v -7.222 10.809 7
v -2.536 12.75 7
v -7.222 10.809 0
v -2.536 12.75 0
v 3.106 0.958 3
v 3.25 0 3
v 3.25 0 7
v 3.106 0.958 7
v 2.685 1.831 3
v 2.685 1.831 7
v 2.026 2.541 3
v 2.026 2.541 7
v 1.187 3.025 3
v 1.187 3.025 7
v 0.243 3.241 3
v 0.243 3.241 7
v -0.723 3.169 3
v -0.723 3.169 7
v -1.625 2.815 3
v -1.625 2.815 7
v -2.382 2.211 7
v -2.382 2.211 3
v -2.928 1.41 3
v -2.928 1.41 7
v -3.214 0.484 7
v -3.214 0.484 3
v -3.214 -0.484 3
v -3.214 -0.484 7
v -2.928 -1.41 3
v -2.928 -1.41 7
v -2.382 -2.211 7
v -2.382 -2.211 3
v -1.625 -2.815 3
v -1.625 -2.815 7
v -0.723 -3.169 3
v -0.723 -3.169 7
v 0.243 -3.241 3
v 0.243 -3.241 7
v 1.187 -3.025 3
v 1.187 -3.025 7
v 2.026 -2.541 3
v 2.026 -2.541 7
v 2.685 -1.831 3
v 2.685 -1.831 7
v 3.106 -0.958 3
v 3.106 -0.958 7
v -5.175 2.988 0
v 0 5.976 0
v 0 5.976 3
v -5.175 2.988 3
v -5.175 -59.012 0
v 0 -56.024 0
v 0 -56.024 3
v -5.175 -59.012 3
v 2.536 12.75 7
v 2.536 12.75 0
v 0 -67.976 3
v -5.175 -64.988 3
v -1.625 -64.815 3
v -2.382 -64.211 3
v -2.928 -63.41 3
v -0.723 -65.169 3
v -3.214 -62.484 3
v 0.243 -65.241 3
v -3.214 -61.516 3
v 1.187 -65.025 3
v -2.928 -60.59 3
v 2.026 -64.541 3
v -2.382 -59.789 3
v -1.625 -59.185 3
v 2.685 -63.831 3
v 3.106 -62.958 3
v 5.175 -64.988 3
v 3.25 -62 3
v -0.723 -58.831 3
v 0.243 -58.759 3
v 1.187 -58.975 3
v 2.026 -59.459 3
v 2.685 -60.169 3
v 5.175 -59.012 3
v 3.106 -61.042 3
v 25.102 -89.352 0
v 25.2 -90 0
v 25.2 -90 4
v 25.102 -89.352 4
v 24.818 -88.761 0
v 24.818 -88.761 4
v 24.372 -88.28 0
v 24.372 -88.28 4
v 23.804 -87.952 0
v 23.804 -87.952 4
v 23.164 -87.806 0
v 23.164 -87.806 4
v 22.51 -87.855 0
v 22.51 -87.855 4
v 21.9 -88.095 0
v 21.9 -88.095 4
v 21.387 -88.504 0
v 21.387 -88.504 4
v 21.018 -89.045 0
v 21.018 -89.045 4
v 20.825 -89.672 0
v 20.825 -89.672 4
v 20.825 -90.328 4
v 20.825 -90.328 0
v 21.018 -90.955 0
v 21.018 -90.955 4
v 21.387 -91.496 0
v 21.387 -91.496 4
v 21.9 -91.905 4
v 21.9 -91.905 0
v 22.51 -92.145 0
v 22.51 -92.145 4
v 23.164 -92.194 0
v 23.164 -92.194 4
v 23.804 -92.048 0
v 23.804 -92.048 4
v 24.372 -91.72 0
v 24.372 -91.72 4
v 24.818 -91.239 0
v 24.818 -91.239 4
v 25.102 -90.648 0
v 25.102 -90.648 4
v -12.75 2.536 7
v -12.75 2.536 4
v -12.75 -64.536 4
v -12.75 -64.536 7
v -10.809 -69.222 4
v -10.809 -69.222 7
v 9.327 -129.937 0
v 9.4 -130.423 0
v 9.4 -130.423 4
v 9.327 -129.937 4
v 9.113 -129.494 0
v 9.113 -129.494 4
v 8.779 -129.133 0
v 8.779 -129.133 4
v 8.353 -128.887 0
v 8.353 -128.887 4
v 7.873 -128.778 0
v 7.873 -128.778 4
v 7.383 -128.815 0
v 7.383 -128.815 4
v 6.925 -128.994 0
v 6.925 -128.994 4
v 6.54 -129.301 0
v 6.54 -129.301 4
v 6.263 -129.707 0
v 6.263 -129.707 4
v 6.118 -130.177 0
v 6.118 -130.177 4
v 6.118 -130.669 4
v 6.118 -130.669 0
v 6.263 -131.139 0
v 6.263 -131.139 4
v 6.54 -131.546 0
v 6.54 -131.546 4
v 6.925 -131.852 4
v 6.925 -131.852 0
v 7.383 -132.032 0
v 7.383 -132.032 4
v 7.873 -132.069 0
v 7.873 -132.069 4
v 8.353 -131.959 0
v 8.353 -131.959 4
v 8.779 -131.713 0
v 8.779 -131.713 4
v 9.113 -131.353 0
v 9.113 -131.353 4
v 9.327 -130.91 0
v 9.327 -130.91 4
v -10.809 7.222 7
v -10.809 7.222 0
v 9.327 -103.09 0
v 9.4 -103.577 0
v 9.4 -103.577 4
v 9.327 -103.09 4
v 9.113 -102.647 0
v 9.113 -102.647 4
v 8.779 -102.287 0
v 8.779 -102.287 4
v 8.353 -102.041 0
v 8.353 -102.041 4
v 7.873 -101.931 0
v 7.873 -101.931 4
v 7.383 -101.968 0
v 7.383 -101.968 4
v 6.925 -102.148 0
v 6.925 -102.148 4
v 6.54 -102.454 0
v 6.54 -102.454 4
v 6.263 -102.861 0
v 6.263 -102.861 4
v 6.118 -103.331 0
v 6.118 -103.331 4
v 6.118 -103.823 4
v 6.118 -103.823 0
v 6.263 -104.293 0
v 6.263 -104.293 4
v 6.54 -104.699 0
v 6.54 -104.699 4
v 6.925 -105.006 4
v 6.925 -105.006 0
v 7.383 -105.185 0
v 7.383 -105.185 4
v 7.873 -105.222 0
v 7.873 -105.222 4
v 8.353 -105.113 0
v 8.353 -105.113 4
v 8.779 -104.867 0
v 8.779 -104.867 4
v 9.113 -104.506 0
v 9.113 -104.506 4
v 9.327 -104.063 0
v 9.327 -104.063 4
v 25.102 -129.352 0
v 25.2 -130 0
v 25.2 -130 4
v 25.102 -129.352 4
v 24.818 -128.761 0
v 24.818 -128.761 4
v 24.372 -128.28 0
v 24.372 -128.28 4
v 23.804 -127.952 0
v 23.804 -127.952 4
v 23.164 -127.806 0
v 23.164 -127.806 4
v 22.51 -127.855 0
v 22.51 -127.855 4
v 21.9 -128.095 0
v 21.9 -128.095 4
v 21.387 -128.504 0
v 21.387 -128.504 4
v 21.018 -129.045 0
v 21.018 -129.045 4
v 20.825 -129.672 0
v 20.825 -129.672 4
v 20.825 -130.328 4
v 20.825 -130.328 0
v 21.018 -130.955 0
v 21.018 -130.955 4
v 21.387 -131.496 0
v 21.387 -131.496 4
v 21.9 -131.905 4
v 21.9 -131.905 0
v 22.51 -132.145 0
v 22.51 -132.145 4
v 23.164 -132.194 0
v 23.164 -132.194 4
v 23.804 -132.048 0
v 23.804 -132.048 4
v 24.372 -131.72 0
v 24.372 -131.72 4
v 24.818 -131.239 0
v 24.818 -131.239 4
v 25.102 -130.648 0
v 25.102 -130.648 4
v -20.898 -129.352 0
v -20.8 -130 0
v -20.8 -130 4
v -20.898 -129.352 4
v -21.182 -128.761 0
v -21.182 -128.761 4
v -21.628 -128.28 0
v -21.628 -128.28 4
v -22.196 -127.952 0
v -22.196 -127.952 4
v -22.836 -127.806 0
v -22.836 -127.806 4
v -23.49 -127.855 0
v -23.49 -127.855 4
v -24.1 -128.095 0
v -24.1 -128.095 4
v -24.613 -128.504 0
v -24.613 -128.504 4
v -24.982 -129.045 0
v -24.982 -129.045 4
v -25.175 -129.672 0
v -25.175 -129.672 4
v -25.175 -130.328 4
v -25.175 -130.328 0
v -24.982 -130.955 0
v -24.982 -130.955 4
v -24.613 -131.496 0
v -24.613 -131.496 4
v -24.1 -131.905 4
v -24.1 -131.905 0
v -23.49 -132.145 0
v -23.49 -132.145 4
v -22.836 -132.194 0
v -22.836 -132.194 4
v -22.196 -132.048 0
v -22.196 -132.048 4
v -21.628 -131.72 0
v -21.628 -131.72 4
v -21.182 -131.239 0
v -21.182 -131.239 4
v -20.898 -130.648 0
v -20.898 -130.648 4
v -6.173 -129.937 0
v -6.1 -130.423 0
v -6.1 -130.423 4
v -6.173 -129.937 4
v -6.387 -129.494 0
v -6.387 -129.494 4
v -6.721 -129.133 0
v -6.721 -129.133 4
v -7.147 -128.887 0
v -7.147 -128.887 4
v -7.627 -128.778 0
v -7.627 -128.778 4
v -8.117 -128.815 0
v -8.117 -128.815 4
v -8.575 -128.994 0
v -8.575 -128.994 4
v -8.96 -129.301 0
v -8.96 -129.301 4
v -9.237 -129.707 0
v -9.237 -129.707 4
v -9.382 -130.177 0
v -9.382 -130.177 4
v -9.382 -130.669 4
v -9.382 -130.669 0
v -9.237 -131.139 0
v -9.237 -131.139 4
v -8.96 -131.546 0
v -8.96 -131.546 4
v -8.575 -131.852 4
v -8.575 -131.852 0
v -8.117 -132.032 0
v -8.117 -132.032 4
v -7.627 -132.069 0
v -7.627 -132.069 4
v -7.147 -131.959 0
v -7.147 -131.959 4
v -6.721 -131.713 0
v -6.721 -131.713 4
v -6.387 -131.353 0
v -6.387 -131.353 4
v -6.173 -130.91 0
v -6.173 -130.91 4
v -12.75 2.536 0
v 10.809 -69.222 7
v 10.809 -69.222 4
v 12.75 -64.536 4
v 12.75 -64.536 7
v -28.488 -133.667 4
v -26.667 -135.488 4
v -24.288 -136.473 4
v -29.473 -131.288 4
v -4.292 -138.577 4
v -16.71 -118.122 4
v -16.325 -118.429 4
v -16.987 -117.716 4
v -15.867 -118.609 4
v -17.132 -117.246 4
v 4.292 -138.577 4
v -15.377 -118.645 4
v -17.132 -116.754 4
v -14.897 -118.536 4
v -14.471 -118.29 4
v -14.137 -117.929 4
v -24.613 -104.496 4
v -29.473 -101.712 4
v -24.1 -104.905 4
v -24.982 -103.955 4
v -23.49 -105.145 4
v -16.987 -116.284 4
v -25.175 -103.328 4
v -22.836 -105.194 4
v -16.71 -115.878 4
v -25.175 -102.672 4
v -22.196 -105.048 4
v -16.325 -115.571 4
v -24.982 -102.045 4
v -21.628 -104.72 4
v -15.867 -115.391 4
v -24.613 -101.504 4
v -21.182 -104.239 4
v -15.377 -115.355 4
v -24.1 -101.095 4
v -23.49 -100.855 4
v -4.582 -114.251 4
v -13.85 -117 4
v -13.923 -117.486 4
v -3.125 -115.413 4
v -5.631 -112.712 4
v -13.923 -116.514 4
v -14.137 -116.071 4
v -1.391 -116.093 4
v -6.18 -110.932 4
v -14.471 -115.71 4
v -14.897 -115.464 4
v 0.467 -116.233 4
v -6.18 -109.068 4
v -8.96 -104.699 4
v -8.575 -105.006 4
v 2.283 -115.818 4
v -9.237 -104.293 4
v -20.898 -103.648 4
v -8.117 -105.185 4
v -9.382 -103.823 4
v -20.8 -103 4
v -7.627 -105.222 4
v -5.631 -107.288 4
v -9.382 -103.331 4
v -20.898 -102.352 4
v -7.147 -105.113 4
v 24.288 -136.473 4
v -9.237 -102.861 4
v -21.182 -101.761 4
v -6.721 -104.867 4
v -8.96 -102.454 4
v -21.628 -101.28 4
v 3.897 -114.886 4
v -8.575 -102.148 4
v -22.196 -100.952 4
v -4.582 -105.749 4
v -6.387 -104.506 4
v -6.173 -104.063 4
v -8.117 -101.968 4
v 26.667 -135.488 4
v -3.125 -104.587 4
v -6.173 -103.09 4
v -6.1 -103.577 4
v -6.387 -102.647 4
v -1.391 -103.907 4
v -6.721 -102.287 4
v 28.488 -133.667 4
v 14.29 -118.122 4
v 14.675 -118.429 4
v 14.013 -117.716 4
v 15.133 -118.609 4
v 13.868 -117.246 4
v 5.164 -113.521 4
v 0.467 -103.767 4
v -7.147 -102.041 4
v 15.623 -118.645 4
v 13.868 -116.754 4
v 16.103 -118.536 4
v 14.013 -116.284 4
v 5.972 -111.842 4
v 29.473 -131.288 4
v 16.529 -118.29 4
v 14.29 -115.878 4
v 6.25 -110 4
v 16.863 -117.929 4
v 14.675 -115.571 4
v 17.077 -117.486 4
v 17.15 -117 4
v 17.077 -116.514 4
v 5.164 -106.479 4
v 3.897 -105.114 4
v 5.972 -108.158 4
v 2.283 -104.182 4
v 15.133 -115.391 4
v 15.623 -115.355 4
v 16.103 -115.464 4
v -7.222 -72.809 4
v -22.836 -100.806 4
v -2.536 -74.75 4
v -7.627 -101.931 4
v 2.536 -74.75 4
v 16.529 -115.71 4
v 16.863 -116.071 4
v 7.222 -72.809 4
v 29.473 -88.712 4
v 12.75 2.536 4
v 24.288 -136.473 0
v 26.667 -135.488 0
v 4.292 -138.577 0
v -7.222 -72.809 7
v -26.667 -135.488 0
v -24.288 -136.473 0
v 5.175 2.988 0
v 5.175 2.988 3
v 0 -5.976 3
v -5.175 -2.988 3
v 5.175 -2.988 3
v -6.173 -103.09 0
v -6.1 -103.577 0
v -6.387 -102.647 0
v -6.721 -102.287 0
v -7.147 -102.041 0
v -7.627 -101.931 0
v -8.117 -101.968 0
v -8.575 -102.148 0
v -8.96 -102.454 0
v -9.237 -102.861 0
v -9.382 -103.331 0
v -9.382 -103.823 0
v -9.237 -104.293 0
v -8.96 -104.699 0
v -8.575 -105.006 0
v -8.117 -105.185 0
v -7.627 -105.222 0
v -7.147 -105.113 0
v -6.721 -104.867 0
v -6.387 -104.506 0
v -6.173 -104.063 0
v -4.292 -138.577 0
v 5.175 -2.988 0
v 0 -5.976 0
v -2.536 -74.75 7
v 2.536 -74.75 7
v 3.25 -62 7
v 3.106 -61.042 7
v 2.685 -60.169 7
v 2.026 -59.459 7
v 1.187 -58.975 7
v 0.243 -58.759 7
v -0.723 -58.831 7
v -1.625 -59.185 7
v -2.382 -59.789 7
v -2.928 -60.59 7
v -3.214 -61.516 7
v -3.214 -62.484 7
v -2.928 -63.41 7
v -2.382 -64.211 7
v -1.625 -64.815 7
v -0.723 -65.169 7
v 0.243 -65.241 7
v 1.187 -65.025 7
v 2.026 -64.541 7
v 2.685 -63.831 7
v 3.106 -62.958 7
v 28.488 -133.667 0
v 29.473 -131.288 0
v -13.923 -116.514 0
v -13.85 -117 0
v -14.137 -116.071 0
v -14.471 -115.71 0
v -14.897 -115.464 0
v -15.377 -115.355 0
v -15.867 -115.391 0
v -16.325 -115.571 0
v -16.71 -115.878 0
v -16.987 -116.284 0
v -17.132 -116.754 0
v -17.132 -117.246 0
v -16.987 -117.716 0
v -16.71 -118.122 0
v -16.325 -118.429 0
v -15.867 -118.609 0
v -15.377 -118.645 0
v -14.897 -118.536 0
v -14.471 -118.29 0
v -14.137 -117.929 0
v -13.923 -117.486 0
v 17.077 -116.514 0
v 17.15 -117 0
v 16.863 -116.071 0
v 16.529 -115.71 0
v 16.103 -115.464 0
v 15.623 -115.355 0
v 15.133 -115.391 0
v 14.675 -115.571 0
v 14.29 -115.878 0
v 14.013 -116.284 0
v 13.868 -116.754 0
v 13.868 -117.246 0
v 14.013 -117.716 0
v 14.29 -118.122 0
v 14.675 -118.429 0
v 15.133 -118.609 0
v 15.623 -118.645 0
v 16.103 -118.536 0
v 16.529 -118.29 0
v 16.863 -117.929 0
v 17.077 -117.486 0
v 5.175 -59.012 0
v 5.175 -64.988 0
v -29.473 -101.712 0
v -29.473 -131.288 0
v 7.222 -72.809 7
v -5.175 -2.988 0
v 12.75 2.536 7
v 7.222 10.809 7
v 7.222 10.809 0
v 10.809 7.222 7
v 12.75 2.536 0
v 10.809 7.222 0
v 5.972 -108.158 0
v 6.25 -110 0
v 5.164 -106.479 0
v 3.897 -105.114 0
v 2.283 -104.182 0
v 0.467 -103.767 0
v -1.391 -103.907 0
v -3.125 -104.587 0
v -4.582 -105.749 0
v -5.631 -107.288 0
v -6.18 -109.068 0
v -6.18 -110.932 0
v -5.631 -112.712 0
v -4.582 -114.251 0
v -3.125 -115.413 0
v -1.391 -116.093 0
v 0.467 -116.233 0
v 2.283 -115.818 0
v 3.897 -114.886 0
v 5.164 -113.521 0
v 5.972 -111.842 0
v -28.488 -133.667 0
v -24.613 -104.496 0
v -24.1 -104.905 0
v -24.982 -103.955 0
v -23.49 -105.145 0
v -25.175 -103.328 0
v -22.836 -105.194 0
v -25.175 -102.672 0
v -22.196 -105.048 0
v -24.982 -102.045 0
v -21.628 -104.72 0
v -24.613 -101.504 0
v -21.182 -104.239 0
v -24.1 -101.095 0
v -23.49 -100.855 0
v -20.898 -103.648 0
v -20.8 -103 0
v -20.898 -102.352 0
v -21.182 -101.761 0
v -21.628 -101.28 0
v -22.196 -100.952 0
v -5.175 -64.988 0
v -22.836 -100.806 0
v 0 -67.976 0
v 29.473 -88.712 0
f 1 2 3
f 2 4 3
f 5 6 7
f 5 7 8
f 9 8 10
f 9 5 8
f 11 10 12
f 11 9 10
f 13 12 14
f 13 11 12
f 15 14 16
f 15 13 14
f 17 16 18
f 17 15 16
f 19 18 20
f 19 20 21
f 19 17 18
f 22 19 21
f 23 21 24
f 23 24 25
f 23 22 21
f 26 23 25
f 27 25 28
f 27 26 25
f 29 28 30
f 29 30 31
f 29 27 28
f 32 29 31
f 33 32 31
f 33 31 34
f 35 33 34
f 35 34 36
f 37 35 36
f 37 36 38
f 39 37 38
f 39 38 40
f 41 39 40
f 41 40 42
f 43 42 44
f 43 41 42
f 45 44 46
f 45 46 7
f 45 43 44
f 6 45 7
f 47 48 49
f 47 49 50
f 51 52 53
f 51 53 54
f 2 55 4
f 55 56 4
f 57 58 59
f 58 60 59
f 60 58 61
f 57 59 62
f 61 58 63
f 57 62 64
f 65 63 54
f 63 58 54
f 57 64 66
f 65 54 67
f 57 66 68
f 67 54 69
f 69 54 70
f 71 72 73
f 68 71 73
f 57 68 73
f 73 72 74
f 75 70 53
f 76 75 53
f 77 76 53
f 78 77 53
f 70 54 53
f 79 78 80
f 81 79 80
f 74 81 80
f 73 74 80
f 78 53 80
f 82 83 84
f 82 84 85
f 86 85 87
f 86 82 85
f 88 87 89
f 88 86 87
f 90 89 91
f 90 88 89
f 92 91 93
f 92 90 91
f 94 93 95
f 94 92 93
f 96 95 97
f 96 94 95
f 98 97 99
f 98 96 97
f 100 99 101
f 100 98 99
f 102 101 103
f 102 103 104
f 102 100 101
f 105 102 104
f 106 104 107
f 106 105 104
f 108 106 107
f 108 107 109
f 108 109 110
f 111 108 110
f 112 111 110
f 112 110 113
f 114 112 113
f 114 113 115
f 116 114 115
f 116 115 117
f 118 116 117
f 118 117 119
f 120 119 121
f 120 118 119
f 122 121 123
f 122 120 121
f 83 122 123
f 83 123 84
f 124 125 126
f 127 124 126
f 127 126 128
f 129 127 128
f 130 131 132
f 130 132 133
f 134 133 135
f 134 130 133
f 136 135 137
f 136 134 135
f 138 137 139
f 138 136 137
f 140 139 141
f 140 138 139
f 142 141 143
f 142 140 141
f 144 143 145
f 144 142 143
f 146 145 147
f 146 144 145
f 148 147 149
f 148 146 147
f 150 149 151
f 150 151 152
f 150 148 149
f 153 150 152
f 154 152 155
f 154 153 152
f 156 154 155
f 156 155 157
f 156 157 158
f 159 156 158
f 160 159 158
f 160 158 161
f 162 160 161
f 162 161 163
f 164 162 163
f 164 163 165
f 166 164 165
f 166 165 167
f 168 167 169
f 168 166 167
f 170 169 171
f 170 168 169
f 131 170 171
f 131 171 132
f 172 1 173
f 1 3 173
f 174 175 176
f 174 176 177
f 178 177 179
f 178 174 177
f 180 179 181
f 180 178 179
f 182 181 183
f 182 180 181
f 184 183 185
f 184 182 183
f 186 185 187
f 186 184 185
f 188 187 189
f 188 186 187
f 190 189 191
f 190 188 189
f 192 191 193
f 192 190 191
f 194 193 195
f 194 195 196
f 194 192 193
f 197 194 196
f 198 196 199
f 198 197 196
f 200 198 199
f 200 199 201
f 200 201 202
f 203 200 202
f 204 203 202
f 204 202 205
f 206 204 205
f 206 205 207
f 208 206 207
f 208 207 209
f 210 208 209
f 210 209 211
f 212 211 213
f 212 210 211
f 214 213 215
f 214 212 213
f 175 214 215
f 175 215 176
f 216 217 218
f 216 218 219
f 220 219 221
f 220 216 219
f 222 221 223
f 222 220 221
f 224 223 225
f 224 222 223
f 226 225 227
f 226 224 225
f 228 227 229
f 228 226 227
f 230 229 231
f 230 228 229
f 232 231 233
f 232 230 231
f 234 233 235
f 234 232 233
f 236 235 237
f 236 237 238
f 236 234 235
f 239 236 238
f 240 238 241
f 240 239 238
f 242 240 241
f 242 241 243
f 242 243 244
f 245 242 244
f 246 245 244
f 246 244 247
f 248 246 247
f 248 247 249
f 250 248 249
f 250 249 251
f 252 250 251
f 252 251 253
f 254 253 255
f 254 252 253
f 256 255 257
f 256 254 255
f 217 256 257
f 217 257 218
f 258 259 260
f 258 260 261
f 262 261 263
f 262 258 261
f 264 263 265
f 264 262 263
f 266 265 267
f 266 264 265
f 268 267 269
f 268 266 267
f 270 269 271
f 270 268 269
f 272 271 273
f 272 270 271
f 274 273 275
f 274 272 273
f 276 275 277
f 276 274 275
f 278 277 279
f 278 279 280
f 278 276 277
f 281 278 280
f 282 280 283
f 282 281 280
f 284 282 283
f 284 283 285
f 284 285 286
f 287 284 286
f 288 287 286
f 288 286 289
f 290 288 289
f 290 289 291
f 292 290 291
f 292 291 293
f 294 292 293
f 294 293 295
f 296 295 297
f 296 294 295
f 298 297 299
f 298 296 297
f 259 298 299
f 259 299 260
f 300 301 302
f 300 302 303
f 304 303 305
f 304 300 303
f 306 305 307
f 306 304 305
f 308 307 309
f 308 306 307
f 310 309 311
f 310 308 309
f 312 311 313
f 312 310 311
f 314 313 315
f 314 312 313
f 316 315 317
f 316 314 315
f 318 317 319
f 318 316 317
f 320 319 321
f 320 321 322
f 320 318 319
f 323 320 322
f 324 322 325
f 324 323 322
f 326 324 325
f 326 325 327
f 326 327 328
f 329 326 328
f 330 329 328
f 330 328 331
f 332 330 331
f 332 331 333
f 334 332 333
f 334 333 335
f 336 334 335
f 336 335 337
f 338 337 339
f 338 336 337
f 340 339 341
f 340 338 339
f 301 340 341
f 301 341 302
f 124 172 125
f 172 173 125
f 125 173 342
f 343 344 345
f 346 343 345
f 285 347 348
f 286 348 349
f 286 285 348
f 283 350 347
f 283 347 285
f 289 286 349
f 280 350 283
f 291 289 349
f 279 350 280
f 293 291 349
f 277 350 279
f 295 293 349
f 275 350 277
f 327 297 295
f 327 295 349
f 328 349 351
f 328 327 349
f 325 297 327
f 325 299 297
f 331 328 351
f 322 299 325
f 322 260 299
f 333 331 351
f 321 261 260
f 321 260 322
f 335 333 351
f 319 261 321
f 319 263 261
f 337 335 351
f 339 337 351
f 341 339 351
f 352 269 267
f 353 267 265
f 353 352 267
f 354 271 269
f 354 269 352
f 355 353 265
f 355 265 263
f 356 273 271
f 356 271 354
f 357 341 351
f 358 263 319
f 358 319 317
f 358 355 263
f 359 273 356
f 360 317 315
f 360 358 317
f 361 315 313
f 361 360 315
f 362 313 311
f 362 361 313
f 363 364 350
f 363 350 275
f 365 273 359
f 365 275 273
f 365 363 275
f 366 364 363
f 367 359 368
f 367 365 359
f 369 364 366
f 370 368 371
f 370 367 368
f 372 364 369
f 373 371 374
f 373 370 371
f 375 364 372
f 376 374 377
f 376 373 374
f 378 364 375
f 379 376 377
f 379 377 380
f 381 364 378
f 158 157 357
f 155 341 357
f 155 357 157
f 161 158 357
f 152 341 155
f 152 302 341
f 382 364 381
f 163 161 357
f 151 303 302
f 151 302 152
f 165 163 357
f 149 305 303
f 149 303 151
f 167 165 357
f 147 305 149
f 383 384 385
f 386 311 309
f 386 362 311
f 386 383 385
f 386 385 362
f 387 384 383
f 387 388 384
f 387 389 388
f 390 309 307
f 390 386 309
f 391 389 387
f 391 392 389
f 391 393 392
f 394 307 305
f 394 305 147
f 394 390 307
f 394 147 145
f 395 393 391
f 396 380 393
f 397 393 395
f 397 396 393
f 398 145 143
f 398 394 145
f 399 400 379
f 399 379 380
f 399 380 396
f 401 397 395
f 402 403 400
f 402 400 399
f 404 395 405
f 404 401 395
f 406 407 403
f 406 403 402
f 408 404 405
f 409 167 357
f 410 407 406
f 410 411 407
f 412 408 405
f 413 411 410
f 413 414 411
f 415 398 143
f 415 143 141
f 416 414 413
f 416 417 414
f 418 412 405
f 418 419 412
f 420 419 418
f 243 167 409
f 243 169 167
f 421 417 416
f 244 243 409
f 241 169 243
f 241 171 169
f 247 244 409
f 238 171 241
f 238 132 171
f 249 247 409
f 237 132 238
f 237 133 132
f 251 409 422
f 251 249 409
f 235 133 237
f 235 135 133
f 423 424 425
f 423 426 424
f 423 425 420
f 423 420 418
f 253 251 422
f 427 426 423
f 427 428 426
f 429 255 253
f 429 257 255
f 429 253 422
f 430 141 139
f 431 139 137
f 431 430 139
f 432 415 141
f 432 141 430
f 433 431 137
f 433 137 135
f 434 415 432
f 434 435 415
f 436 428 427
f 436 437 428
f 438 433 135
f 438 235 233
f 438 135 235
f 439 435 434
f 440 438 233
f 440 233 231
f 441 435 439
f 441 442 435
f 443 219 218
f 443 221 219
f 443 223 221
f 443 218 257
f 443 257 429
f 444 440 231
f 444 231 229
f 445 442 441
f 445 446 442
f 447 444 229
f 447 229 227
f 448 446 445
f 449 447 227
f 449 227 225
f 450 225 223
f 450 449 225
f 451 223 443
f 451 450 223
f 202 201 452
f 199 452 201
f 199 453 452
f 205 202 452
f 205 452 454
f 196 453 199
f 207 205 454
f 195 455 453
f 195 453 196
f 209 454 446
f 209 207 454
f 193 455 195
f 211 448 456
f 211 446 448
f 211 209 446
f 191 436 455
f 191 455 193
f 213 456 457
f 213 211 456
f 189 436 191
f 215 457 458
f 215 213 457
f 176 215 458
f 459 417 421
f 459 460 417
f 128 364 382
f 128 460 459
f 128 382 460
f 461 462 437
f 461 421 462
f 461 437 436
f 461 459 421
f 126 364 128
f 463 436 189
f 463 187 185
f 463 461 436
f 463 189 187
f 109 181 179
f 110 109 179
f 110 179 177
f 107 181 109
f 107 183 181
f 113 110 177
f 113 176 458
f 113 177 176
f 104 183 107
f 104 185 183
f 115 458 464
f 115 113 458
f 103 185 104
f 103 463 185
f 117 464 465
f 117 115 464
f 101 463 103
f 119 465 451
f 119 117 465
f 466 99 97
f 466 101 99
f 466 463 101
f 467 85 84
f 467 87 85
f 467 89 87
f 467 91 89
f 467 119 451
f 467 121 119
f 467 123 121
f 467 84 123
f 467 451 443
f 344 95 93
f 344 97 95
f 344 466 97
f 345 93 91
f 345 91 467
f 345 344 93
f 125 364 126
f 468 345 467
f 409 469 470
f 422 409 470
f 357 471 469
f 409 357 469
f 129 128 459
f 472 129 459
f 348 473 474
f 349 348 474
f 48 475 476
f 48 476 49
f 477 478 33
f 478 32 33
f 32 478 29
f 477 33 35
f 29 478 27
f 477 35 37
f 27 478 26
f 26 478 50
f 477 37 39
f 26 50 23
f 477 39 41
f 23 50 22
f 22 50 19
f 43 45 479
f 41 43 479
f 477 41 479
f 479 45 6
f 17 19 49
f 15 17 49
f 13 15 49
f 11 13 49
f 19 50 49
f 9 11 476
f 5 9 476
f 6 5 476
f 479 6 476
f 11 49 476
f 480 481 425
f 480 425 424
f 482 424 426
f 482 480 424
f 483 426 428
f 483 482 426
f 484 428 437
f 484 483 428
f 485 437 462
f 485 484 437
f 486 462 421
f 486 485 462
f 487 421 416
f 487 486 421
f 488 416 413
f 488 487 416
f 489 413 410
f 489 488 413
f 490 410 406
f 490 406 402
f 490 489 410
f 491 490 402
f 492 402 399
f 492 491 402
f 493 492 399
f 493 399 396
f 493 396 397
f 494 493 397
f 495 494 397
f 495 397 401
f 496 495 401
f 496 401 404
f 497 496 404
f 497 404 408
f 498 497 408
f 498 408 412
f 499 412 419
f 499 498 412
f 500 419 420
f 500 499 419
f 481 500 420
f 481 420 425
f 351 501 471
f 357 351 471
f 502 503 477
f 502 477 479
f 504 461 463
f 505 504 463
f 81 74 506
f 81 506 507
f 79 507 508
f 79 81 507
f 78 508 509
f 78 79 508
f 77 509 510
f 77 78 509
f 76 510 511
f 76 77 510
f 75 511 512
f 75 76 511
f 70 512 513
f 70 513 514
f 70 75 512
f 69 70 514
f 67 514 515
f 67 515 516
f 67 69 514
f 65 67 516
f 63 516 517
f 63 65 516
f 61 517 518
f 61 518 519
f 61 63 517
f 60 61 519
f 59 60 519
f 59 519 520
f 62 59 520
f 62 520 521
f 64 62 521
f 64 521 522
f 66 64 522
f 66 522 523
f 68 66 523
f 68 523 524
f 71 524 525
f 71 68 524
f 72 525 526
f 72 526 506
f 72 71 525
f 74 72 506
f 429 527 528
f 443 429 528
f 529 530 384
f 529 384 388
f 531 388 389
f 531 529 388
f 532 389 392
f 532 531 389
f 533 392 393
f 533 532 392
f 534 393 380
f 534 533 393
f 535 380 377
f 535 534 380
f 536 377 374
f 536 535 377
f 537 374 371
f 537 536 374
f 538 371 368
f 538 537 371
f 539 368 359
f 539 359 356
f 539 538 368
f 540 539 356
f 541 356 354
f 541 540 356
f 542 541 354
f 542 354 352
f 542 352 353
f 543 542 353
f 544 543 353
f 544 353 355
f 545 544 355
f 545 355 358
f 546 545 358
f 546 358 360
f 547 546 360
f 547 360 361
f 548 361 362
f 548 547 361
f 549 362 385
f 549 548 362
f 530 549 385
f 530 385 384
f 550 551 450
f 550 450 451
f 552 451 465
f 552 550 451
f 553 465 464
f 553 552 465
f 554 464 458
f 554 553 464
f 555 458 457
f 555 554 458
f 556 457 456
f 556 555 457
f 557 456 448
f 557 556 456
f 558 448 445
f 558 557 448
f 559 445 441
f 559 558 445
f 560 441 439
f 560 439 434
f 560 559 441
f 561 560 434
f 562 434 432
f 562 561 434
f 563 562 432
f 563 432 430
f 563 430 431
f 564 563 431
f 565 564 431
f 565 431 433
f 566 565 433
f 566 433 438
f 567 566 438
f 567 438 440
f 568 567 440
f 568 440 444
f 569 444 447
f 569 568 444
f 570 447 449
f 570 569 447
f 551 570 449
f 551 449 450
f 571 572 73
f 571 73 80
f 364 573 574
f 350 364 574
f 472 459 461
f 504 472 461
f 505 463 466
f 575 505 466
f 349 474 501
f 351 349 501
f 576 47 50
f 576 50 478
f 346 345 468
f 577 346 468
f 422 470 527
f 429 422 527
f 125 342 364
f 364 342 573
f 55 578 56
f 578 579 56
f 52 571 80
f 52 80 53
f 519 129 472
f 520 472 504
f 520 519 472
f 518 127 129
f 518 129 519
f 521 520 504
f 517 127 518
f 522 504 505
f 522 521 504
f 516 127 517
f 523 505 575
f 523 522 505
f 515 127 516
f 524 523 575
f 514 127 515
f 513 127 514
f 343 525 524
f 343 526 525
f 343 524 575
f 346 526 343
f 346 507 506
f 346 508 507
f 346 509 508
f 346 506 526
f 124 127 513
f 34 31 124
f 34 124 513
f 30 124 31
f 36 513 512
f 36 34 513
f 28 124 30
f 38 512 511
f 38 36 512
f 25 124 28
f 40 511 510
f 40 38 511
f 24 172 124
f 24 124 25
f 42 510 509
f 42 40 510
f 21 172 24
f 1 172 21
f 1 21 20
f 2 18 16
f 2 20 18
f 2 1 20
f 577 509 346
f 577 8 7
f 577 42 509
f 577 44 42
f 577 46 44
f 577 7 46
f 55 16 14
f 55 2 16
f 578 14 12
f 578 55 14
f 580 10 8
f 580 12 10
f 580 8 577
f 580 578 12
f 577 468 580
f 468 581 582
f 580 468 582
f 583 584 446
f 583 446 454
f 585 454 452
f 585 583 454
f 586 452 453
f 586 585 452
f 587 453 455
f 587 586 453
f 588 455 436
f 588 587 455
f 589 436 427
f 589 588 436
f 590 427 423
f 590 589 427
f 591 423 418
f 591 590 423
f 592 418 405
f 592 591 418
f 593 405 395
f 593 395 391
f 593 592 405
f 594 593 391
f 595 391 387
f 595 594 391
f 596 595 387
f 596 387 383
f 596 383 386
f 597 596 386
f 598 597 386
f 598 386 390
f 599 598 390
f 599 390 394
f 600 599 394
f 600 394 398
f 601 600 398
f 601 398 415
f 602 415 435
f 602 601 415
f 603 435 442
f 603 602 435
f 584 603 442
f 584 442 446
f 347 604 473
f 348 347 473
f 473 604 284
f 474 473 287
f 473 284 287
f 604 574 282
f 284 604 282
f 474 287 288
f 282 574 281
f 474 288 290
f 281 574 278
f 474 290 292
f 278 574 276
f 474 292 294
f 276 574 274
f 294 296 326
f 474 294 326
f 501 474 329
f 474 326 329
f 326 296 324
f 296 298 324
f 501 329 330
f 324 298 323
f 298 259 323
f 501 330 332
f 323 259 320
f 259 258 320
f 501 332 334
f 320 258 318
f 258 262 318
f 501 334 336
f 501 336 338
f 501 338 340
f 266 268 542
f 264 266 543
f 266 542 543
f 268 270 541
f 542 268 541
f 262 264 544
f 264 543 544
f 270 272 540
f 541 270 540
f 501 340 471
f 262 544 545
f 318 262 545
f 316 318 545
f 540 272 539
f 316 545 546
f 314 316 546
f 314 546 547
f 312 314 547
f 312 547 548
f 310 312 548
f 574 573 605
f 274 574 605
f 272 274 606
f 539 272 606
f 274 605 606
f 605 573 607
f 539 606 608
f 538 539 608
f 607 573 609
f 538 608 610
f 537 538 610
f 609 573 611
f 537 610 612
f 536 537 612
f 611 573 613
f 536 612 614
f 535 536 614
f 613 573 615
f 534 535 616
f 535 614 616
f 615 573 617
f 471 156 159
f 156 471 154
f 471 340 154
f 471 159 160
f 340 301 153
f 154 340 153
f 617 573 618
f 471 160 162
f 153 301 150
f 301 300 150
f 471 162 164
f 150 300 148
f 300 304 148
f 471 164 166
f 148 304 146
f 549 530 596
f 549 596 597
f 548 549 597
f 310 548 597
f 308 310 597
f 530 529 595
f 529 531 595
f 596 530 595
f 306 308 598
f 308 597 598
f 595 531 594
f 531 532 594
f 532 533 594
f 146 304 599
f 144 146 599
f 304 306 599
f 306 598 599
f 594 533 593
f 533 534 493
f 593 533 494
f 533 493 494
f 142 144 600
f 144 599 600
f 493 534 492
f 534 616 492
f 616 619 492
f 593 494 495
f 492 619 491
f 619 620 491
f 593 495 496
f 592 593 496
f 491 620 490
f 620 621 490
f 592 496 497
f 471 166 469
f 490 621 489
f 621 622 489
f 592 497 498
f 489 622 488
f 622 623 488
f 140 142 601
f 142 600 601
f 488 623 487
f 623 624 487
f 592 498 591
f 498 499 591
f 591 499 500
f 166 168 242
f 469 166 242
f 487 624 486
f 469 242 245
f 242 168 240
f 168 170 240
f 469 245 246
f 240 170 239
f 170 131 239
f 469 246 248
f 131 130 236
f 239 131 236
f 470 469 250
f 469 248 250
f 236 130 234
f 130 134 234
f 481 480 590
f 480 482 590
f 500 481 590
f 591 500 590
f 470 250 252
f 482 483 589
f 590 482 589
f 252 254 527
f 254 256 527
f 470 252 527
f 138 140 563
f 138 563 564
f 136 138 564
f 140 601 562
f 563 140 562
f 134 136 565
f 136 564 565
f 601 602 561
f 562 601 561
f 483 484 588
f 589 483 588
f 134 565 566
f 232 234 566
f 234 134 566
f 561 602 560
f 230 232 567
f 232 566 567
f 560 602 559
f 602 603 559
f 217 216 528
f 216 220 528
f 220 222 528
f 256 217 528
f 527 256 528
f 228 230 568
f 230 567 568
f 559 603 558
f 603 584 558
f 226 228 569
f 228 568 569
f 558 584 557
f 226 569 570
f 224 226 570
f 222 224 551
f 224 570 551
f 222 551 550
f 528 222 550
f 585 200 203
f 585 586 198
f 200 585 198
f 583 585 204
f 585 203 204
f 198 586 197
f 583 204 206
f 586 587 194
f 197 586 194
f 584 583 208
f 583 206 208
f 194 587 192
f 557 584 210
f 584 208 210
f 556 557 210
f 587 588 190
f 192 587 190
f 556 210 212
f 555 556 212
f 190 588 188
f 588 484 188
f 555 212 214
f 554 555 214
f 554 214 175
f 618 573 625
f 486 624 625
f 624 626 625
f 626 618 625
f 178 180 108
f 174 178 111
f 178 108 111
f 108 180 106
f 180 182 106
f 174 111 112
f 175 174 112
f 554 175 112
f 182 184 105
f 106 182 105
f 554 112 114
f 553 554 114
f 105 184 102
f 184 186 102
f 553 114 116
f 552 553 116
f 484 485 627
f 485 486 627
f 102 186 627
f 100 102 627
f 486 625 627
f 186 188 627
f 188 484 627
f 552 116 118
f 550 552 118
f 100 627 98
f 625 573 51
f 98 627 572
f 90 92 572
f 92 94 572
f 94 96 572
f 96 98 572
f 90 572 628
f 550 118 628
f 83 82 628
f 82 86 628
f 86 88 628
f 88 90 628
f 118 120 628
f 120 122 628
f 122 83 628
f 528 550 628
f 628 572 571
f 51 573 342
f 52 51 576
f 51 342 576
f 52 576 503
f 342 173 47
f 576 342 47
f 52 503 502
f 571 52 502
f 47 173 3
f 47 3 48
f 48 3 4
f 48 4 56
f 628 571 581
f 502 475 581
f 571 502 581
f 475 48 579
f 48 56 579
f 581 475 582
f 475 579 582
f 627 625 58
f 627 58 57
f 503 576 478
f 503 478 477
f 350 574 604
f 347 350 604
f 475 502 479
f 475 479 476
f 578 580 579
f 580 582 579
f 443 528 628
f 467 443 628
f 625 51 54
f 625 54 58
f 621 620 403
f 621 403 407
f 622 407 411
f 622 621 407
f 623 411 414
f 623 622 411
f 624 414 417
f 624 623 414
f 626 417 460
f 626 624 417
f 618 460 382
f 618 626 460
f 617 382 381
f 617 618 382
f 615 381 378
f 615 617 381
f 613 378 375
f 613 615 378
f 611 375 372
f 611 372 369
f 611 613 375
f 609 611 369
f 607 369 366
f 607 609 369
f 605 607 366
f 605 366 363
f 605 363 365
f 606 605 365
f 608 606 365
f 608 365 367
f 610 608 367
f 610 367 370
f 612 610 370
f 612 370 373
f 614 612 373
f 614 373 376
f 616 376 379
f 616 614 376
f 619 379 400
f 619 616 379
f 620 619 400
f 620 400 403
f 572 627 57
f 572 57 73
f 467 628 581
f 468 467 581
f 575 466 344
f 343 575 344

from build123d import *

# Parameters (mm, degrees)
PROFILE_1_R         = 3.25
PROFILE_1_R_2       = 6.25
PROFILE_1_R_3       = 1.65
PROFILE_1_R_4       = 2.2
WHEEL_CARRIER_DEPTH = 4
PIVOT_LANDS_START   = 4
PROFILE_2_R         = 3.25
PIVOT_LANDS_DEPTH   = 3
NUT_SEATS_C_D_START = -0.01
NUT_SEATS_C_D_DEPTH = 3.01


with BuildPart() as part:
    # Profile_1 → Wheel_carrier (new body)
    with BuildSketch(Plane.XY):
        Polygon((-12.750208645, 2.536174186), (-29.473182851, -101.712403875), (-29.473182851, -131.287596125), (-28.487699441, -133.666763538), (-26.666763538, -135.487699441), (-24.287596125, -136.473182851), (-4.291987084, -138.577276169), (4.291987084, -138.577276169), (24.287596125, -136.473182851), (26.666763538, -135.487699441), (28.487699441, -133.666763538), (29.473182851, -131.287596125), (29.473182851, -88.712403875), (12.750208645, 2.536174186), (10.80910496, 7.222413029), (7.222413029, 10.80910496), (2.536174186, 12.750208645), (-2.536174186, 12.750208645), (-7.222413029, 10.80910496), (-10.80910496, 7.222413029), align=None)
        Circle(PROFILE_1_R, mode=Mode.SUBTRACT)
        with Locations((0, -62)):
            Circle(PROFILE_1_R, mode=Mode.SUBTRACT)
        with Locations((0, -110)):
            Circle(PROFILE_1_R_2, mode=Mode.SUBTRACT)
        with Locations((15.5, -117)):
            Circle(PROFILE_1_R_3, mode=Mode.SUBTRACT)
        with Locations((7.75, -103.576606241)):
            Circle(PROFILE_1_R_3, mode=Mode.SUBTRACT)
        with Locations((-7.75, -103.576606241)):
            Circle(PROFILE_1_R_3, mode=Mode.SUBTRACT)
        with Locations((-15.5, -117)):
            Circle(PROFILE_1_R_3, mode=Mode.SUBTRACT)
        with Locations((-7.75, -130.423393759)):
            Circle(PROFILE_1_R_3, mode=Mode.SUBTRACT)
        with Locations((7.75, -130.423393759)):
            Circle(PROFILE_1_R_3, mode=Mode.SUBTRACT)
        with Locations((-23, -130)):
            Circle(PROFILE_1_R_4, mode=Mode.SUBTRACT)
        with Locations((23, -130)):
            Circle(PROFILE_1_R_4, mode=Mode.SUBTRACT)
        with Locations((-23, -103)):
            Circle(PROFILE_1_R_4, mode=Mode.SUBTRACT)
        with Locations((23, -90)):
            Circle(PROFILE_1_R_4, mode=Mode.SUBTRACT)
    extrude(amount=WHEEL_CARRIER_DEPTH)

    # Profile_2 → Pivot_lands (add)
    with BuildSketch(Plane.XY.offset(PIVOT_LANDS_START)):
        Polygon((12.750208645, -64.536174186), (12.750208645, 2.536174186), (10.80910496, 7.222413029), (7.222413029, 10.80910496), (2.536174186, 12.750208645), (-2.536174186, 12.750208645), (-7.222413029, 10.80910496), (-10.80910496, 7.222413029), (-12.750208645, 2.536174186), (-12.750208645, -64.536174186), (-10.80910496, -69.222413029), (-7.222413029, -72.80910496), (-2.536174186, -74.750208645), (2.536174186, -74.750208645), (7.222413029, -72.80910496), (10.80910496, -69.222413029), align=None)
        Circle(PROFILE_2_R, mode=Mode.SUBTRACT)
        with Locations((0, -62)):
            Circle(PROFILE_2_R, mode=Mode.SUBTRACT)
    extrude(amount=PIVOT_LANDS_DEPTH)

    # Profile_3 → Nut_seats_C_D (cut)
    with BuildSketch(Plane.XY.offset(NUT_SEATS_C_D_START)):
        Polygon((5.175, 2.987787643), (0, 5.975575286), (-5.175, 2.987787643), (-5.175, -2.987787643), (0, -5.975575286), (5.175, -2.987787643), align=None)
        Polygon((5.175, -59.012212357), (0, -56.024424714), (-5.175, -59.012212357), (-5.175, -64.987787643), (0, -67.975575286), (5.175, -64.987787643), align=None)
    extrude(amount=NUT_SEATS_C_D_DEPTH, mode=Mode.SUBTRACT)


solid = part.part
